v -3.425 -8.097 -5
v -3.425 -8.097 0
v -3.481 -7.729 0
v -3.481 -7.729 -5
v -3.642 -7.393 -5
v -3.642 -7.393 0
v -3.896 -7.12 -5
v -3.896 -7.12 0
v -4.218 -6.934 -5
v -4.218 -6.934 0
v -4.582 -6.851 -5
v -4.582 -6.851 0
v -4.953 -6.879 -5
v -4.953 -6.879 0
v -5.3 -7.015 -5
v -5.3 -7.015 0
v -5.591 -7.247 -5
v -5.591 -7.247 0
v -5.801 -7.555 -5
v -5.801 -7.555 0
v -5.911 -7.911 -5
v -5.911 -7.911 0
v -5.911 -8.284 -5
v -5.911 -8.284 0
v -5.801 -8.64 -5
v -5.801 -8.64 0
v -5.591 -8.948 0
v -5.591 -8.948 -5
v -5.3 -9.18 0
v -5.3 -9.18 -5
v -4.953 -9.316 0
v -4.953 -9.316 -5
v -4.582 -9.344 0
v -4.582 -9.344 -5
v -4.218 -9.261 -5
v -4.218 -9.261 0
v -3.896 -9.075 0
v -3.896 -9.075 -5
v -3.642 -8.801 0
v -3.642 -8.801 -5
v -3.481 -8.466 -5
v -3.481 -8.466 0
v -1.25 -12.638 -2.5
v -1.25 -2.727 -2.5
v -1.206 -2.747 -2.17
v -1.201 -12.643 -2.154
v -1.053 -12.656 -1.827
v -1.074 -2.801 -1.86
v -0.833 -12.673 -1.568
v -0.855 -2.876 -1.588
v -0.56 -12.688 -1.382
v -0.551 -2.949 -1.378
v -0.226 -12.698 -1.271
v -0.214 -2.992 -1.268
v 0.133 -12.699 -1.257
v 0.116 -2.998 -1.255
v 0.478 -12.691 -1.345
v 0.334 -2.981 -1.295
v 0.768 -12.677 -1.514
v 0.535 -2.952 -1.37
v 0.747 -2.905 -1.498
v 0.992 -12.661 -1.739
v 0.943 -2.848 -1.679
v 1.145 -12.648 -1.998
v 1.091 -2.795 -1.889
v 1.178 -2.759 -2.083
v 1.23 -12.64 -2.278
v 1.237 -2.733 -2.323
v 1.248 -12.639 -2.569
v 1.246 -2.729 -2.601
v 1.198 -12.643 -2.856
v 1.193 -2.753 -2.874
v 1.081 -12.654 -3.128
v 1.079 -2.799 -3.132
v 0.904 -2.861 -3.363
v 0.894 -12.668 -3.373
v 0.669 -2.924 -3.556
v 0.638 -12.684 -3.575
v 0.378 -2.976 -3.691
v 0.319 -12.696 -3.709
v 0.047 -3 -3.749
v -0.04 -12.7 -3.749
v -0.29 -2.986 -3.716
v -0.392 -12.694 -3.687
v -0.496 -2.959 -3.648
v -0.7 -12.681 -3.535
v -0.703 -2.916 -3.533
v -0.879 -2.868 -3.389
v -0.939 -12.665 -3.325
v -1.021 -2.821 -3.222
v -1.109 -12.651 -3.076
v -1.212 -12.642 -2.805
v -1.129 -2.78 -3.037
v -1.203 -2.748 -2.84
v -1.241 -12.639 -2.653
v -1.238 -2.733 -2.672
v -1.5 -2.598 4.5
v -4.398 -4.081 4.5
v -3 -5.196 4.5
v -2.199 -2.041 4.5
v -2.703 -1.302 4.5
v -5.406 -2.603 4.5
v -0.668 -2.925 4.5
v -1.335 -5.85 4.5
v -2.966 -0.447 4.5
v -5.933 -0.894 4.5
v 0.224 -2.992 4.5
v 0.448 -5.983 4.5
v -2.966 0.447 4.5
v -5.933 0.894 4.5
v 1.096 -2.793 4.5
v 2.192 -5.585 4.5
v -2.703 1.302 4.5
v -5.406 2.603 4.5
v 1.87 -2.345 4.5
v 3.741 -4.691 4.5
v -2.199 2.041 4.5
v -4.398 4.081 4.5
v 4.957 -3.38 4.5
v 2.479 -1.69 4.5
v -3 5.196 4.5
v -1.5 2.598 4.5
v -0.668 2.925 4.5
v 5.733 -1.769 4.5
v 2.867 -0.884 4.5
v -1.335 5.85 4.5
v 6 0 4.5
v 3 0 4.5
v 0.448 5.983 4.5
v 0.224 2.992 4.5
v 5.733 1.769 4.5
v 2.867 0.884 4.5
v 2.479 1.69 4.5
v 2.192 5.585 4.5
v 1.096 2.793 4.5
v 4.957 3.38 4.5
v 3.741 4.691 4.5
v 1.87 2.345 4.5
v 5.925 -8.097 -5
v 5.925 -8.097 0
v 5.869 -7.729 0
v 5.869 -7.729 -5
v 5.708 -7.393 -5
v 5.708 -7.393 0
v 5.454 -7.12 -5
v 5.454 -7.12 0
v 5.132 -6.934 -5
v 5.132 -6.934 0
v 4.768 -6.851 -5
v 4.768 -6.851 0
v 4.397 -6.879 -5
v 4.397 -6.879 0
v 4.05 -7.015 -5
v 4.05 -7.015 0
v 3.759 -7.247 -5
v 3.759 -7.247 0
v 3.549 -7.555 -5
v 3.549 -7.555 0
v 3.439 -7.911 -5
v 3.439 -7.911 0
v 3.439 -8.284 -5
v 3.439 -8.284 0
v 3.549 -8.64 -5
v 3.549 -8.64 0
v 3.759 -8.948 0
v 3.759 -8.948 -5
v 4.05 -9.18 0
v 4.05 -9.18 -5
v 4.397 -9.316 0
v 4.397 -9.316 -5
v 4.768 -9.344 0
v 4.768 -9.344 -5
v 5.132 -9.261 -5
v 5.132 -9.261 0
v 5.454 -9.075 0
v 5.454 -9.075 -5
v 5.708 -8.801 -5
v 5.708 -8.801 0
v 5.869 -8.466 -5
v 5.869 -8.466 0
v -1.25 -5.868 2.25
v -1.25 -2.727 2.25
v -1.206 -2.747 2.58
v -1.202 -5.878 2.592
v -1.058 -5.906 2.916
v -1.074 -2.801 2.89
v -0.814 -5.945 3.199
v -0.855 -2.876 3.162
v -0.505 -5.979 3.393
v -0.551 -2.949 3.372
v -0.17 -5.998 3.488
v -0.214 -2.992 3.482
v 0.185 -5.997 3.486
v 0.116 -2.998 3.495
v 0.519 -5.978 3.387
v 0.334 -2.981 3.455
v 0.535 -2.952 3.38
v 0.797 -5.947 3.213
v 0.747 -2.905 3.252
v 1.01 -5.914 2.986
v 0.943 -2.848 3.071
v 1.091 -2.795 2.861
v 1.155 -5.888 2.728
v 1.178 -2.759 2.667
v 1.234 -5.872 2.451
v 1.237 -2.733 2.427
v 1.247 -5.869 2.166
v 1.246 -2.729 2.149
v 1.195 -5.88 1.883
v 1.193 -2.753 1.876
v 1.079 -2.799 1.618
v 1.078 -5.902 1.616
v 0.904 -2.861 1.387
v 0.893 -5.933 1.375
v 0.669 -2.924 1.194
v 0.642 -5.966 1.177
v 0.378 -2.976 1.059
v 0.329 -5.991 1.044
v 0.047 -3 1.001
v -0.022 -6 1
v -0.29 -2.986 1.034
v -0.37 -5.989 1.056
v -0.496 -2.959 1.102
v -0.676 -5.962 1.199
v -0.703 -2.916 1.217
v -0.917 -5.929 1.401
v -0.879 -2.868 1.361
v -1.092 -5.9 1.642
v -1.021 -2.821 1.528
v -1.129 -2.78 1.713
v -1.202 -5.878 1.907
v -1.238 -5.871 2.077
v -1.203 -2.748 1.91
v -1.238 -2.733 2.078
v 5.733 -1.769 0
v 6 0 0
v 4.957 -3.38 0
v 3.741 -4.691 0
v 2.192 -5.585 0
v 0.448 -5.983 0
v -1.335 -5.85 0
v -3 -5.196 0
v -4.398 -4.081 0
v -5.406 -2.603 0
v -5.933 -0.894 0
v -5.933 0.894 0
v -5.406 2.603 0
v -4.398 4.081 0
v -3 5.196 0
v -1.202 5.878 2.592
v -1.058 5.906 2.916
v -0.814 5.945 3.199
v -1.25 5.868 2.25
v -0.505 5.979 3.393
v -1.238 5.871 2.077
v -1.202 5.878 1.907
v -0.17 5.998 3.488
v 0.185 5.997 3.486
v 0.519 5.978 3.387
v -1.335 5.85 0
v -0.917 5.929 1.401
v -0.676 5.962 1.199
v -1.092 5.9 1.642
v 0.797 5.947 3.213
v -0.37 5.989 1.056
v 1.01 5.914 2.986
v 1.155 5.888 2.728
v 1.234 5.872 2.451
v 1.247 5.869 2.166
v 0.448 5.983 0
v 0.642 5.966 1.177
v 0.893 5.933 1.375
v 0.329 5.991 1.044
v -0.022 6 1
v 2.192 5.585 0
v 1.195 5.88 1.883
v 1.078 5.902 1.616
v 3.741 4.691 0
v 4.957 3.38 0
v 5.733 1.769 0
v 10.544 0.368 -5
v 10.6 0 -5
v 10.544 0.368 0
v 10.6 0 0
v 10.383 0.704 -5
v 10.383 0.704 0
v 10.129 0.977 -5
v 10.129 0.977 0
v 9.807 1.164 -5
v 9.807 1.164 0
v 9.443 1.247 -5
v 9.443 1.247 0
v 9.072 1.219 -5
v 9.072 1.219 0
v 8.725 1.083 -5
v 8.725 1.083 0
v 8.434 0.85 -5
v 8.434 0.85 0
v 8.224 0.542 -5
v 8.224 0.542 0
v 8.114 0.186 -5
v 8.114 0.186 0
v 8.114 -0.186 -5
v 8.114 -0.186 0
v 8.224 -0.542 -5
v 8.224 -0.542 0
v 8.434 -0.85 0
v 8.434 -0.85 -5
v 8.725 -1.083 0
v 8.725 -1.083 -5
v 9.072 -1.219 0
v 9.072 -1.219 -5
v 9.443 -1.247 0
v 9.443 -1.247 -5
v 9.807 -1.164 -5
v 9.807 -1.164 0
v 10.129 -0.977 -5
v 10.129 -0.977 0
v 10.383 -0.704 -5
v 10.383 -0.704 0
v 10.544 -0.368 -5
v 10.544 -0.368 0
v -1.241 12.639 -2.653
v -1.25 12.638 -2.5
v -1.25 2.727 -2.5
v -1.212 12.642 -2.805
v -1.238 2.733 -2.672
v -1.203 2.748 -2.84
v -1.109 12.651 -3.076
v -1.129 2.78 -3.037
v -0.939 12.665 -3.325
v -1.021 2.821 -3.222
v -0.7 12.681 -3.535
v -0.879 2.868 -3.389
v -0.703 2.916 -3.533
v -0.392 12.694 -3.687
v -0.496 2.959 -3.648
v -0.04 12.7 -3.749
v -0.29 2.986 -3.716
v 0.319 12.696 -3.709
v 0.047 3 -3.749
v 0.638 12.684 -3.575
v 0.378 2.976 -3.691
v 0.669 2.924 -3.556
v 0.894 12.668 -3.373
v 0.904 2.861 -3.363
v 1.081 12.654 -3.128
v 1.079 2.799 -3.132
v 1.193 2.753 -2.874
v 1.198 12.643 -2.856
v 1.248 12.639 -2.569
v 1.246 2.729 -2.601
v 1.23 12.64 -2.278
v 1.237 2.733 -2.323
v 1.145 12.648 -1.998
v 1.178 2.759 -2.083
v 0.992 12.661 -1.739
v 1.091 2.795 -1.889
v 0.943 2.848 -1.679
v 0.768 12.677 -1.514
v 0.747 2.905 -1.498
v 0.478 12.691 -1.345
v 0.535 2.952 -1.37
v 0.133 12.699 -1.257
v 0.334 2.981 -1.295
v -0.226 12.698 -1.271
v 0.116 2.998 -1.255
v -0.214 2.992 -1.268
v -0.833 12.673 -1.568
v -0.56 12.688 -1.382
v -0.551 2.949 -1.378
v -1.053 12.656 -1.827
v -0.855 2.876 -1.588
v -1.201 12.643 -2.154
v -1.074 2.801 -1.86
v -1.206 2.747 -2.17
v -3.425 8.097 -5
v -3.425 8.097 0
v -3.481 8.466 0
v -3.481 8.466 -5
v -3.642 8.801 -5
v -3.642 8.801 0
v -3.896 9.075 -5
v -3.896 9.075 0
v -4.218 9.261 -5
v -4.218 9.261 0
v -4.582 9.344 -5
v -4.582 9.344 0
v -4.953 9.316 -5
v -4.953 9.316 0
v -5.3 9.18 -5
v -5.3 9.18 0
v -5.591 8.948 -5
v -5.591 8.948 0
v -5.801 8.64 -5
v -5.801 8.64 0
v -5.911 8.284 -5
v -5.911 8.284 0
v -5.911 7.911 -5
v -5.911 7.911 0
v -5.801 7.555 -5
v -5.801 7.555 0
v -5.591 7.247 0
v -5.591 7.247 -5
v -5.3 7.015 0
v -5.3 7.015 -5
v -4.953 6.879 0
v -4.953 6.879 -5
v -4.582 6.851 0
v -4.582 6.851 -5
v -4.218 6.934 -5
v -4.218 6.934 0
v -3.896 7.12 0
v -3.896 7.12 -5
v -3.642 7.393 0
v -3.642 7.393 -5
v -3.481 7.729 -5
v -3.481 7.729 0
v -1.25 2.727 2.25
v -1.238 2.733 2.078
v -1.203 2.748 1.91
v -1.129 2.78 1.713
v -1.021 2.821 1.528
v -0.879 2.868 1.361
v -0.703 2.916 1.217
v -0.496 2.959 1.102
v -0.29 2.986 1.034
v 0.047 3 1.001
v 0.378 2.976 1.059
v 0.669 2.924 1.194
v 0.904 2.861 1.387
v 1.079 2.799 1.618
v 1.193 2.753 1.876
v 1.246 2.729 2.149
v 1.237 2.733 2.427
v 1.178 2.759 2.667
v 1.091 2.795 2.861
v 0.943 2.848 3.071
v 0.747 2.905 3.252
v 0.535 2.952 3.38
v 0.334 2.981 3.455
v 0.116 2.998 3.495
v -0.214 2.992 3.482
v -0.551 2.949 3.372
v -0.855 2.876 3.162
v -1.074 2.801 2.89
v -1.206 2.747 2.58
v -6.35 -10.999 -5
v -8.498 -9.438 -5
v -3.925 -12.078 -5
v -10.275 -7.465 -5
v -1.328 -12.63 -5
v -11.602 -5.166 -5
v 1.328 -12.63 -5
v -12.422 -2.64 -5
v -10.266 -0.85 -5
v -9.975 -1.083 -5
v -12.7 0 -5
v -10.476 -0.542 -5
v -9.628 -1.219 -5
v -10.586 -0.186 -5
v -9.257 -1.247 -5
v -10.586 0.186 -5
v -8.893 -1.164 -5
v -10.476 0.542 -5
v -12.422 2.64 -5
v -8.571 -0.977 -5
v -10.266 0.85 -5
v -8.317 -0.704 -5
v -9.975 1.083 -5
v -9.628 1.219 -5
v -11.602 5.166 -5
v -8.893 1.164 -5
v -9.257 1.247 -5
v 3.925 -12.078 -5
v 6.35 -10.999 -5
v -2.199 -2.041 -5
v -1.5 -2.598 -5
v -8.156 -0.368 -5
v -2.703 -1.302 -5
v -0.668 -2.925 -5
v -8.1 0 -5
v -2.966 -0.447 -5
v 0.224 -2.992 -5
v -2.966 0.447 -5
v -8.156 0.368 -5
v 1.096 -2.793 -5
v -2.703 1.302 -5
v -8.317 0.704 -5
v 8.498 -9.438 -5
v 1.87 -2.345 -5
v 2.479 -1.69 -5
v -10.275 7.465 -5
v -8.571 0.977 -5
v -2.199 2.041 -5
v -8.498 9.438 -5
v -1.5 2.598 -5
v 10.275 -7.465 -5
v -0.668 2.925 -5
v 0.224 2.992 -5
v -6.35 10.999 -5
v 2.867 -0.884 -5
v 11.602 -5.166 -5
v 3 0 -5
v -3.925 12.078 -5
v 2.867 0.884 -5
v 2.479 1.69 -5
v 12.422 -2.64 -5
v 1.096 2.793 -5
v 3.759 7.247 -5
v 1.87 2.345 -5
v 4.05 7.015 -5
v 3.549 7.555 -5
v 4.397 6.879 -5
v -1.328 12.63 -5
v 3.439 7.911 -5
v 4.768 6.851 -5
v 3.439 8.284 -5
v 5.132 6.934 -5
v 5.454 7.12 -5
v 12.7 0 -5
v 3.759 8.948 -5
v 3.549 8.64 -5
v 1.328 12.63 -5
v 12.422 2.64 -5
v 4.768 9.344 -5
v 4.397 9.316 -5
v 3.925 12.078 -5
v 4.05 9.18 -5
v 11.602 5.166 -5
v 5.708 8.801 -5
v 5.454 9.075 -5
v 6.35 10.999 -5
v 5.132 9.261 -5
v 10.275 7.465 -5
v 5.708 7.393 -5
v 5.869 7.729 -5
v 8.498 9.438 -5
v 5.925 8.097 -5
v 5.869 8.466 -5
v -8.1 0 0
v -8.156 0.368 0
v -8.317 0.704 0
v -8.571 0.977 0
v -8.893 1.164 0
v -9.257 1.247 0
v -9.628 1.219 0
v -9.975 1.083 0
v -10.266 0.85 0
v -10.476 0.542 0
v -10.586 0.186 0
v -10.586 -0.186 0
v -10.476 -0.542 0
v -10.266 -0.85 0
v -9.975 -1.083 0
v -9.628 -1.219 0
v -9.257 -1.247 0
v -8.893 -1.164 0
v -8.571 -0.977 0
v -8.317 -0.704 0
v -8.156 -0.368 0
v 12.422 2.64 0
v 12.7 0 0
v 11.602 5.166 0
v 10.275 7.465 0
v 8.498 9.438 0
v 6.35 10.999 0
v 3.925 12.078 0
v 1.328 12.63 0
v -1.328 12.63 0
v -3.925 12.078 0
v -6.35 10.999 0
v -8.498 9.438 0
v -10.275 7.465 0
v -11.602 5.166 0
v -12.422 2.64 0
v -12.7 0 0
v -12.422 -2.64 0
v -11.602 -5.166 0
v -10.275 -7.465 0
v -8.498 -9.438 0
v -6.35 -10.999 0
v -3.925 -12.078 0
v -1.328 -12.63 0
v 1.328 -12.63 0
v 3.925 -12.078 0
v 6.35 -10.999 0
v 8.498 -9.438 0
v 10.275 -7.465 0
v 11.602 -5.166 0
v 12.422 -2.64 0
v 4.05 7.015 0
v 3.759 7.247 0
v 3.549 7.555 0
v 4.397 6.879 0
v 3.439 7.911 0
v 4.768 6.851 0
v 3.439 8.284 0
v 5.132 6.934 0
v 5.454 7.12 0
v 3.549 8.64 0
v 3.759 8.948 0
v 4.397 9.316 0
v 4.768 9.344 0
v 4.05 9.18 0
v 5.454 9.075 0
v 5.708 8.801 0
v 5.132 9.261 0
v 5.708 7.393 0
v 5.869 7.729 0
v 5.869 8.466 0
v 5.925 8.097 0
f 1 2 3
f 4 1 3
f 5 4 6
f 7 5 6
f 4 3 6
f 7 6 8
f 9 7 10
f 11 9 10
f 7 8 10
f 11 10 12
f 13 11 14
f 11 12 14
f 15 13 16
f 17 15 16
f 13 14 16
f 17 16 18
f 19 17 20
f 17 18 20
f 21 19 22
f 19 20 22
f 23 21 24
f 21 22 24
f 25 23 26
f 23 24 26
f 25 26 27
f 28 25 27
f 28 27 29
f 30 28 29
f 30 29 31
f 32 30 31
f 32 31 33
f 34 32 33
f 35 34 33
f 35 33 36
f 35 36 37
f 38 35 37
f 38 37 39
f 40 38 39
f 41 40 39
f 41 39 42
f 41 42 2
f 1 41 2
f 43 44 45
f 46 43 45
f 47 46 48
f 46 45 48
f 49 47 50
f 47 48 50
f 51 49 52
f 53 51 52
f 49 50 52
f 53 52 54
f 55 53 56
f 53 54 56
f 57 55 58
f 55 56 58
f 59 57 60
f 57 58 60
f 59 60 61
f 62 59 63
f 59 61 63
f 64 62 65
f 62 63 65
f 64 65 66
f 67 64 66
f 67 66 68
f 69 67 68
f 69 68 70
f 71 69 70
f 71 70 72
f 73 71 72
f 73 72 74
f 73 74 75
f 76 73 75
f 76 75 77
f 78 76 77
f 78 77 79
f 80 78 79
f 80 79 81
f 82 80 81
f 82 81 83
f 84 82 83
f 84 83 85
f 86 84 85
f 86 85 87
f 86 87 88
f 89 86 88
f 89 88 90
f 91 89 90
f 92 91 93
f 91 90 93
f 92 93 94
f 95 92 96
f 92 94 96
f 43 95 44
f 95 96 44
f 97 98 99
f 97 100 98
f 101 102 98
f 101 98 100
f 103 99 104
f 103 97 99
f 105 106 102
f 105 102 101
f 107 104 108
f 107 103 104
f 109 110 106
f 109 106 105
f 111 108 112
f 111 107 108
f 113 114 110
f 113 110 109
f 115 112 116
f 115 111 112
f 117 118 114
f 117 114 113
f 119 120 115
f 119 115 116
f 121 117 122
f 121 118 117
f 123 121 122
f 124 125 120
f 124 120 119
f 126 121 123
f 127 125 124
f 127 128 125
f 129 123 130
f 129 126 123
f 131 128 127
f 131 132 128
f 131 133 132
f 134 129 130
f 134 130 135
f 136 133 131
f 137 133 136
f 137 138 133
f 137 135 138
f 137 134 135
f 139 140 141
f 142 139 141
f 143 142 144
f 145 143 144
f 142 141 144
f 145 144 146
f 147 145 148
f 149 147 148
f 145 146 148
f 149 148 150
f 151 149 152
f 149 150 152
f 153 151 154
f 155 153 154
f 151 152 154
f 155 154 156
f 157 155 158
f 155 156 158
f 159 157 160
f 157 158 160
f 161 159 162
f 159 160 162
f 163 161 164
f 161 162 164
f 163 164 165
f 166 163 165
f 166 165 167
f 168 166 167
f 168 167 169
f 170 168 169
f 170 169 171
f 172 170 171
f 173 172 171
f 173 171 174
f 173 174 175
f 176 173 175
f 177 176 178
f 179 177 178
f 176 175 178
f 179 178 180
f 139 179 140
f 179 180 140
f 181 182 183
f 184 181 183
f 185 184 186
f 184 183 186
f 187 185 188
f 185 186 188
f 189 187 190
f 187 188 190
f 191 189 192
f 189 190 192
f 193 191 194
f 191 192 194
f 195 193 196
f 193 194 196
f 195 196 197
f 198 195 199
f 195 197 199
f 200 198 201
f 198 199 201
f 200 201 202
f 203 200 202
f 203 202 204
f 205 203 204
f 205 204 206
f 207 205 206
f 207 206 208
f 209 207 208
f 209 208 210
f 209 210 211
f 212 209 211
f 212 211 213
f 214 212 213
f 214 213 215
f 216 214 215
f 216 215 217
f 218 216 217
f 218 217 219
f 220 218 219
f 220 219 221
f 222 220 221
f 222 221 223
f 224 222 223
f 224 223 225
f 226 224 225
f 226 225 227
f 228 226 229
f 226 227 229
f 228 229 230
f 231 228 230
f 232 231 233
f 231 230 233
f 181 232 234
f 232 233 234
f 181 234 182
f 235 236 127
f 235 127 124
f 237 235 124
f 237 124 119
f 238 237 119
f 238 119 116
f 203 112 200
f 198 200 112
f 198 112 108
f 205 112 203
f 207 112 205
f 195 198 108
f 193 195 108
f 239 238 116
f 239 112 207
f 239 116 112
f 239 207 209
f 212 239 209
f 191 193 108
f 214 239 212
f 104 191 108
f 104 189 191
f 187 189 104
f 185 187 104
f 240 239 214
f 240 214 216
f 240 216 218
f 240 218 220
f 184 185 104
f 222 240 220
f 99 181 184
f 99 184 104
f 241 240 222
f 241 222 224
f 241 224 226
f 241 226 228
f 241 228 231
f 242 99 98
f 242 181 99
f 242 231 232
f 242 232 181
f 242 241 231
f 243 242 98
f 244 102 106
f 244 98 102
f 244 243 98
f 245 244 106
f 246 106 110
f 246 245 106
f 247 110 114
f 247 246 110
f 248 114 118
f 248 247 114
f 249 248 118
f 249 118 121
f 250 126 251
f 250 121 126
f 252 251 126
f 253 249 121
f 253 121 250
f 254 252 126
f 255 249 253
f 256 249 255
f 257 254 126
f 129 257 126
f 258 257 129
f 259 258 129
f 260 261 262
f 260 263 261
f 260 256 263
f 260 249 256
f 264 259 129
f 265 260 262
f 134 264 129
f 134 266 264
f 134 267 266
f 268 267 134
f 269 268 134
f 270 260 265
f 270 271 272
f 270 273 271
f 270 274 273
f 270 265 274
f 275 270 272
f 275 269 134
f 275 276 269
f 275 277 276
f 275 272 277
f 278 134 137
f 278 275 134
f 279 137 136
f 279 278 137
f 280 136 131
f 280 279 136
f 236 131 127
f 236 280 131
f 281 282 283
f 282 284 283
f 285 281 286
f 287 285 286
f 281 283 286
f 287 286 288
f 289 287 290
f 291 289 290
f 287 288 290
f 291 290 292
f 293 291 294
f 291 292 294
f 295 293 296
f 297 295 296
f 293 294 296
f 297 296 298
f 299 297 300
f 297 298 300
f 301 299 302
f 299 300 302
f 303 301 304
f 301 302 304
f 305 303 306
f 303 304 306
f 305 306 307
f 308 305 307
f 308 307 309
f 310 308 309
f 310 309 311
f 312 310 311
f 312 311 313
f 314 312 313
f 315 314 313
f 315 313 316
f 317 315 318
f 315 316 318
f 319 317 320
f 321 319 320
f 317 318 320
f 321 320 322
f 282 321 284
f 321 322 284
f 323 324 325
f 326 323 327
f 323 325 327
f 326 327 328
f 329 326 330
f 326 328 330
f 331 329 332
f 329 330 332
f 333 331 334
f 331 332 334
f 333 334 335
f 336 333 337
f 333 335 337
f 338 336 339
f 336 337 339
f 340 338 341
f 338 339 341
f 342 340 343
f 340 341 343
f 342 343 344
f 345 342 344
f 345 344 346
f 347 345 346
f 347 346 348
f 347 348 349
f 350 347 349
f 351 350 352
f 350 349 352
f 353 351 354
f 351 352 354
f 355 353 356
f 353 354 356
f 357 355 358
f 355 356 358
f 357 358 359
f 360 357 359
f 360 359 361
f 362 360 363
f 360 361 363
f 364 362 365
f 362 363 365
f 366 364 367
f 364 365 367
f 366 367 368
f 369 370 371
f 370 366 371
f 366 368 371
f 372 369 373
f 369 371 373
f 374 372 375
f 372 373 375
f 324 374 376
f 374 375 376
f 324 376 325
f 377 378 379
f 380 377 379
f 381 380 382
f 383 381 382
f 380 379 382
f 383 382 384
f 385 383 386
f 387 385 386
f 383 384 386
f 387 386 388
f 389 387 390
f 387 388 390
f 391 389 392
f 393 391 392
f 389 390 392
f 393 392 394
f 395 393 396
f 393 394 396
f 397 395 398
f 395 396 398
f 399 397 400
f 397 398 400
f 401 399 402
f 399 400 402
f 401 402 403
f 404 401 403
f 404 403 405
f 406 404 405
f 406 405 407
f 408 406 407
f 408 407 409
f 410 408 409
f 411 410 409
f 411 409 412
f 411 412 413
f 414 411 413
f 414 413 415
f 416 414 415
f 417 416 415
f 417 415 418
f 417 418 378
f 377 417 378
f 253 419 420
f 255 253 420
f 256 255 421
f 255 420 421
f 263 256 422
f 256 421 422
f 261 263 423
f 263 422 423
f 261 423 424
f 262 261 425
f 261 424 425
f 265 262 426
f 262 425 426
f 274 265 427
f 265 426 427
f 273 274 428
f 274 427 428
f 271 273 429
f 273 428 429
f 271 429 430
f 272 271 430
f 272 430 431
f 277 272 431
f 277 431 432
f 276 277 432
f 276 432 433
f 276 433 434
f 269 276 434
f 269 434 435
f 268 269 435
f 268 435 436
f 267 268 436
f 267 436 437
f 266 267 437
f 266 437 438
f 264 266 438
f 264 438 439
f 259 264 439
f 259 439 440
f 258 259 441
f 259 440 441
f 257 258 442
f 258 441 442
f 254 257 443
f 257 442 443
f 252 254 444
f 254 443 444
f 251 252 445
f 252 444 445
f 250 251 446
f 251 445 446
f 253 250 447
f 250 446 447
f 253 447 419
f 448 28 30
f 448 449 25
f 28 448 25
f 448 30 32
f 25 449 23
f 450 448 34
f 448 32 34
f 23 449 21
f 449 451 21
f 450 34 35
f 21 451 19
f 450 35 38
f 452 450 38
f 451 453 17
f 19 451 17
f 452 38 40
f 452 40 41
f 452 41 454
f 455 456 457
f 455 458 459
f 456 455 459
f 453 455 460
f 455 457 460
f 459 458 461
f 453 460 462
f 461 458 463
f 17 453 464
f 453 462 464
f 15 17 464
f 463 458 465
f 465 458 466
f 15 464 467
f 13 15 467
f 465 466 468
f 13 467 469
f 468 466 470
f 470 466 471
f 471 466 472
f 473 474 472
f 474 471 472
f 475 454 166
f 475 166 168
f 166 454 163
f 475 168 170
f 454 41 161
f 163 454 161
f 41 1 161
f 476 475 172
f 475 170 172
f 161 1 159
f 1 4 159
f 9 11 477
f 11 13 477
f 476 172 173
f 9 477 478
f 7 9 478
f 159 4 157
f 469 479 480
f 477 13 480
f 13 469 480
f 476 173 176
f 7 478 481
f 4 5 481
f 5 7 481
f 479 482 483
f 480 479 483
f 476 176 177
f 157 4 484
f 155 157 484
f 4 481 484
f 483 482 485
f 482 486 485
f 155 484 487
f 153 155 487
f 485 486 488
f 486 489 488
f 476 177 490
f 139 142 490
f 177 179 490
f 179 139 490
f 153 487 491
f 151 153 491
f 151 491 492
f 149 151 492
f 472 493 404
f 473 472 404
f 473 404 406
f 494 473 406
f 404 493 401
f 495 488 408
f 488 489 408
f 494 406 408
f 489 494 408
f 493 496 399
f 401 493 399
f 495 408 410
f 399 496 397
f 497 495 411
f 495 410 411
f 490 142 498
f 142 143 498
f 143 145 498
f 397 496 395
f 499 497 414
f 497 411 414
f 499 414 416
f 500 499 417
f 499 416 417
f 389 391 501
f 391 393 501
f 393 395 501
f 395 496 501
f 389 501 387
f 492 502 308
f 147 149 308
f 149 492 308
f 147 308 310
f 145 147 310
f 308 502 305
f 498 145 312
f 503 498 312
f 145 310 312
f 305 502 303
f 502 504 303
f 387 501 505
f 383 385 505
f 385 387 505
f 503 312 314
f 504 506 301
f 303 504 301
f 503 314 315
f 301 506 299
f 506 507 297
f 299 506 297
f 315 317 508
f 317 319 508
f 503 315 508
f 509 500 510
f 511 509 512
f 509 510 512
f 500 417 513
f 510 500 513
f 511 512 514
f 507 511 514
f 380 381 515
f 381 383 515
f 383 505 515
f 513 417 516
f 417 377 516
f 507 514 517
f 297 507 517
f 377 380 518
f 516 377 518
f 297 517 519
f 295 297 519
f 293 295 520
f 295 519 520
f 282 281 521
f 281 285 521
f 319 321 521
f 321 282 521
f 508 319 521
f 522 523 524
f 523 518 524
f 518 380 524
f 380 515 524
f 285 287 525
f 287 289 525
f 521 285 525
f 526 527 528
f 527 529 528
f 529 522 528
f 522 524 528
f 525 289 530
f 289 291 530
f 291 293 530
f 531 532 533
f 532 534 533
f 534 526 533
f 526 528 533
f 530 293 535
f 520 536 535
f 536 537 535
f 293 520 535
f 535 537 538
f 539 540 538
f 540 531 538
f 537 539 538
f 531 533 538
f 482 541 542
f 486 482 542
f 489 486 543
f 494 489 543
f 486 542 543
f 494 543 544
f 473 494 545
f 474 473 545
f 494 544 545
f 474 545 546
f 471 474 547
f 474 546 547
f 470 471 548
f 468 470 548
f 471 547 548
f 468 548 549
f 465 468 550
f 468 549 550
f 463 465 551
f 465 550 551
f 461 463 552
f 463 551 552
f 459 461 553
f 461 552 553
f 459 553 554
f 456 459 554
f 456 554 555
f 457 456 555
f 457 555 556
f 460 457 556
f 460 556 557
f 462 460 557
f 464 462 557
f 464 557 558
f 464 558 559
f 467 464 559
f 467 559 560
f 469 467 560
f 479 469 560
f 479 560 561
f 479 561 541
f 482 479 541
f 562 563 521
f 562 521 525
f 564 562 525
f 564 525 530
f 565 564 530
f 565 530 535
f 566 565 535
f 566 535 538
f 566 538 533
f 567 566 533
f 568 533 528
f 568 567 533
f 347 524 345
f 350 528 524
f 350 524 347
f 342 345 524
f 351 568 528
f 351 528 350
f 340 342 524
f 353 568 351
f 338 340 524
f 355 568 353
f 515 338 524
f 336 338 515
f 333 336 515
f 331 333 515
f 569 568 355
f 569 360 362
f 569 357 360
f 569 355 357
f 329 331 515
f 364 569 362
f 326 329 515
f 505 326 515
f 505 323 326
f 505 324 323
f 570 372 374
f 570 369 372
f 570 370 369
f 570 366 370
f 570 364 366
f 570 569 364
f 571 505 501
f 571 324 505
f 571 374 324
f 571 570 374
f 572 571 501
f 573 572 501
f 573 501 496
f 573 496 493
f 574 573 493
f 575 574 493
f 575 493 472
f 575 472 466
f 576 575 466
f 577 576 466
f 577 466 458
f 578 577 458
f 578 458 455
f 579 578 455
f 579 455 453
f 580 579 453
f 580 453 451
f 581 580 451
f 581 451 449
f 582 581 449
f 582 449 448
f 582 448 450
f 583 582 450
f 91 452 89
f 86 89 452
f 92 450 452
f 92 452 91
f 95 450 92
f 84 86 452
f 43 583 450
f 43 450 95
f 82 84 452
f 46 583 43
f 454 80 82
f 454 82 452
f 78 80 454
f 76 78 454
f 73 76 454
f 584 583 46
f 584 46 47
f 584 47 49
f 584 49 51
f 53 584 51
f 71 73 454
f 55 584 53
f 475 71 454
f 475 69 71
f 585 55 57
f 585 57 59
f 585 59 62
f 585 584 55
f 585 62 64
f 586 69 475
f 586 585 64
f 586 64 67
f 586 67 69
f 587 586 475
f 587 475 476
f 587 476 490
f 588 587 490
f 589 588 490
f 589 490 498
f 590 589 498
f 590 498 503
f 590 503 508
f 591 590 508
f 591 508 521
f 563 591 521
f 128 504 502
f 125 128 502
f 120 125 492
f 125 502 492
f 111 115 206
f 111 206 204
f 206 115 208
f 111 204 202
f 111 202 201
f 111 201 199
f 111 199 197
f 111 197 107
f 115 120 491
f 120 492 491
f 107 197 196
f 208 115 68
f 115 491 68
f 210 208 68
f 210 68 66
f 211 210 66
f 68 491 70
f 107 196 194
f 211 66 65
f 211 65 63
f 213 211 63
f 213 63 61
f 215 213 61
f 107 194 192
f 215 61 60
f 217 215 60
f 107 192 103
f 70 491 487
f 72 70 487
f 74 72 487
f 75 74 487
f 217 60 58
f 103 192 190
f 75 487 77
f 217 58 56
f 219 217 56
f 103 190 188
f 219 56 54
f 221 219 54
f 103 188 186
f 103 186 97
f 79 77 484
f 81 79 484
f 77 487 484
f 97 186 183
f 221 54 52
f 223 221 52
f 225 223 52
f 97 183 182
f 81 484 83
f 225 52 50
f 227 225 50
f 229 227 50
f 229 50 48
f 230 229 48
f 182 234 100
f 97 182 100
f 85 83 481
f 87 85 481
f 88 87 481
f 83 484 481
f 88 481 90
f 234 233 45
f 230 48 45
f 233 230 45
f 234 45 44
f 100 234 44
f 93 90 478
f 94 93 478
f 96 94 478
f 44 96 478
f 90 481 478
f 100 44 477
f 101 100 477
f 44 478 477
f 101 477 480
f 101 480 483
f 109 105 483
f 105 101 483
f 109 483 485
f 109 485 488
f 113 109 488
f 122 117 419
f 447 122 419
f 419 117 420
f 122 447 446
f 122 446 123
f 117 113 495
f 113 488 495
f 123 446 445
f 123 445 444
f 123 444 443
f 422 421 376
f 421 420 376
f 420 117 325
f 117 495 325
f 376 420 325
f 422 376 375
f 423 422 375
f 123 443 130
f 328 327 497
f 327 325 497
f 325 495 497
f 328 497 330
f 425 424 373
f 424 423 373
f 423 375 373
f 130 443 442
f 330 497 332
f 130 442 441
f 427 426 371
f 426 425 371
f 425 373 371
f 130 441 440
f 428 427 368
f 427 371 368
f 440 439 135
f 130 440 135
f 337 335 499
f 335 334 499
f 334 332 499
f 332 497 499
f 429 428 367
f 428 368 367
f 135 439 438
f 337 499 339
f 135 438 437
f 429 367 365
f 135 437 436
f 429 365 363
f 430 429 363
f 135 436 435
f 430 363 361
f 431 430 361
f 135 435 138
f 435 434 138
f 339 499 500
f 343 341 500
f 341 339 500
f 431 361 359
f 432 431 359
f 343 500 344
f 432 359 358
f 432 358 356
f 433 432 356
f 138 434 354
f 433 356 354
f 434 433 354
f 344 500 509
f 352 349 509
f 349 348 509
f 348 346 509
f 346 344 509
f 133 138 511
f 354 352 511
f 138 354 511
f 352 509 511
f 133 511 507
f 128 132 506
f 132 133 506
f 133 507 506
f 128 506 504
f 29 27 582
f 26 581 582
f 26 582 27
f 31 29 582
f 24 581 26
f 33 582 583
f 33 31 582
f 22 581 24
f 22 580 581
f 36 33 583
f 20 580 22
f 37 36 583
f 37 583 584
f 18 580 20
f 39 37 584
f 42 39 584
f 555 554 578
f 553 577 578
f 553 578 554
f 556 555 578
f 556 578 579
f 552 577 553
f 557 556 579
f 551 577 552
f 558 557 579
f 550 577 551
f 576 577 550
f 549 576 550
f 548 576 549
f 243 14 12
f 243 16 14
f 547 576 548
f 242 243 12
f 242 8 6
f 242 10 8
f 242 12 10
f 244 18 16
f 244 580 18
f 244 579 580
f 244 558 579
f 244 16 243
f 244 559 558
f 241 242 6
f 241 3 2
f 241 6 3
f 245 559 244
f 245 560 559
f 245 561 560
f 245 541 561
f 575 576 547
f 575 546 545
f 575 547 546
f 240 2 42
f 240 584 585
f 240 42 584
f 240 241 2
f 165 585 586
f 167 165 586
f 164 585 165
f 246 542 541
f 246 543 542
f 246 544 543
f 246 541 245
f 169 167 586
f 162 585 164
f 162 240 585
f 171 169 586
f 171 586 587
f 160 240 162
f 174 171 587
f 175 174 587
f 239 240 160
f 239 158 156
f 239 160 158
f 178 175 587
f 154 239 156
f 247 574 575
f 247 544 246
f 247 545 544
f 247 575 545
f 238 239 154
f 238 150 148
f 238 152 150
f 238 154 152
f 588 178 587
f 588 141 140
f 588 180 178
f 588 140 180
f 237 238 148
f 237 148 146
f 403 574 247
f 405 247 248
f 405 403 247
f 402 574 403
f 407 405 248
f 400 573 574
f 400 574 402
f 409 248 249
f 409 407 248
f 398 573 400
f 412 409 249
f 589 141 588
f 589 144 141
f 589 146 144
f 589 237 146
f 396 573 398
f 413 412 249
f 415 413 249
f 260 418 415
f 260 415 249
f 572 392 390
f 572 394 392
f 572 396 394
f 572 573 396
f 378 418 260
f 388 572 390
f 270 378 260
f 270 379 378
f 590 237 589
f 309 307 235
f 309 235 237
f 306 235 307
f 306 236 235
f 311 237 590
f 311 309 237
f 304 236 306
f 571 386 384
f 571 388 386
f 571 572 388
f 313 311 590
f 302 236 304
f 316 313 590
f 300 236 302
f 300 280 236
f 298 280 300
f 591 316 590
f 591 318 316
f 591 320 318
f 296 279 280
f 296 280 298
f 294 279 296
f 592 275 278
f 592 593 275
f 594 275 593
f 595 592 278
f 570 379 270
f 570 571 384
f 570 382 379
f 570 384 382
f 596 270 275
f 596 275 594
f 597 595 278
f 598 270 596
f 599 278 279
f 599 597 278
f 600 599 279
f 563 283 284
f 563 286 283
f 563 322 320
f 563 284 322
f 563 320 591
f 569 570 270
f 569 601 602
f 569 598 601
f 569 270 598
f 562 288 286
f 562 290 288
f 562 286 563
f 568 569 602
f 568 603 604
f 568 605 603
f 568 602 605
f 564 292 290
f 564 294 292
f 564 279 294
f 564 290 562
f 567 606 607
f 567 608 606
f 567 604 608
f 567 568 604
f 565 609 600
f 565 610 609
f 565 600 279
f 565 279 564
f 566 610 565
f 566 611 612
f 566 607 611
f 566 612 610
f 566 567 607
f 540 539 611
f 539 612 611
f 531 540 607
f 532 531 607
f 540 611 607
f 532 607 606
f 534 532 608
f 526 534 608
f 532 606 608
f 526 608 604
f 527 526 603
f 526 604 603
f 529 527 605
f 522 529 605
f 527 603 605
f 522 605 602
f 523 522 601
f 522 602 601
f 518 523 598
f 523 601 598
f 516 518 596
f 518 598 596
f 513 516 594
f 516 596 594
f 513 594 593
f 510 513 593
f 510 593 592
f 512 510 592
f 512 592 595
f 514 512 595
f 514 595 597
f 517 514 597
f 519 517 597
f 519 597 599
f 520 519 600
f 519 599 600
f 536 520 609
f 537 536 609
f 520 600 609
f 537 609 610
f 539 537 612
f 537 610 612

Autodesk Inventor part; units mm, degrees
ref_plane "YZ Plane" through (0, 0, 0) normal (1, 0, 0) x (0, 1, 0)
ref_plane "XZ Plane" through (0, 0, 0) normal (0, 1, 0) x (-1, 0, 0)
ref_plane "XY Plane" through (0, 0, 0) normal (0, 0, 1) x (1, 0, 0)
sketch "Base" plane through (0, 0, 0) normal (0, 0, 1) x (1, 0, 0)
  circle A0 centre (0, 0) radius 3
  circle A1 centre (0, 0) radius 6
  circle A2 centre (0, 0) radius 12.7
  circle A3 centre (0, 0) radius 9.35 construction
  line L0 (0, 6) -> (0, 12.7) construction
  line L1 (0, -17.78) -> (0, 17.78) construction
  circle A4 centre (-9.35, 0) radius 1.25
  line L2 (-17.78, 0) -> (17.78, 0) construction
  circle A5 centre (-4.675, -8.0973) radius 1.25
  circle A6 centre (4.675, -8.0973) radius 1.25
  circle A7 centre (9.35, 0) radius 1.25
  circle A8 centre (4.675, 8.0973) radius 1.25
  circle A9 centre (-4.675, 8.0973) radius 1.25
  point P0 (0, 9.35)
  dimension "d1" = 12
  dimension "d2" = 25.4
  dimension "d0" = 6
  dimension "d3" = 2.5
  dimension "d6" = 360
extrude "BaseFeature" add sketch "Base" against normal blind 5 contours A1 | A2
extrude "FlangeFeature" add sketch "Base" along normal blind 4.5 contours A1
sketch "FixatingHoles" plane through (0, 0, 0) normal (0, 1, 0) x (-1, 0, 0)
  line L0 (-3, 4.5) -> (3, 4.5) construction
  line L1 (0, 4.5) -> (0, 0) construction
  line L2 (12.7, 0) -> (-12.7, 0) projected
  line L3 (3, -5) -> (-3, -5) construction
  line L4 (0, -5) -> (0, 0) construction
  circle A0 centre (0, 2.25) radius 1.25
  circle A1 centre (0, -2.5) radius 1.25
  dimension "d12" = 2.5
  dimension "d13" = 2.5
extrude "FixatingHolesFeature" cut sketch "FixatingHoles" along normal through all both and the other way through all
properties part number "PololuHub1994"
